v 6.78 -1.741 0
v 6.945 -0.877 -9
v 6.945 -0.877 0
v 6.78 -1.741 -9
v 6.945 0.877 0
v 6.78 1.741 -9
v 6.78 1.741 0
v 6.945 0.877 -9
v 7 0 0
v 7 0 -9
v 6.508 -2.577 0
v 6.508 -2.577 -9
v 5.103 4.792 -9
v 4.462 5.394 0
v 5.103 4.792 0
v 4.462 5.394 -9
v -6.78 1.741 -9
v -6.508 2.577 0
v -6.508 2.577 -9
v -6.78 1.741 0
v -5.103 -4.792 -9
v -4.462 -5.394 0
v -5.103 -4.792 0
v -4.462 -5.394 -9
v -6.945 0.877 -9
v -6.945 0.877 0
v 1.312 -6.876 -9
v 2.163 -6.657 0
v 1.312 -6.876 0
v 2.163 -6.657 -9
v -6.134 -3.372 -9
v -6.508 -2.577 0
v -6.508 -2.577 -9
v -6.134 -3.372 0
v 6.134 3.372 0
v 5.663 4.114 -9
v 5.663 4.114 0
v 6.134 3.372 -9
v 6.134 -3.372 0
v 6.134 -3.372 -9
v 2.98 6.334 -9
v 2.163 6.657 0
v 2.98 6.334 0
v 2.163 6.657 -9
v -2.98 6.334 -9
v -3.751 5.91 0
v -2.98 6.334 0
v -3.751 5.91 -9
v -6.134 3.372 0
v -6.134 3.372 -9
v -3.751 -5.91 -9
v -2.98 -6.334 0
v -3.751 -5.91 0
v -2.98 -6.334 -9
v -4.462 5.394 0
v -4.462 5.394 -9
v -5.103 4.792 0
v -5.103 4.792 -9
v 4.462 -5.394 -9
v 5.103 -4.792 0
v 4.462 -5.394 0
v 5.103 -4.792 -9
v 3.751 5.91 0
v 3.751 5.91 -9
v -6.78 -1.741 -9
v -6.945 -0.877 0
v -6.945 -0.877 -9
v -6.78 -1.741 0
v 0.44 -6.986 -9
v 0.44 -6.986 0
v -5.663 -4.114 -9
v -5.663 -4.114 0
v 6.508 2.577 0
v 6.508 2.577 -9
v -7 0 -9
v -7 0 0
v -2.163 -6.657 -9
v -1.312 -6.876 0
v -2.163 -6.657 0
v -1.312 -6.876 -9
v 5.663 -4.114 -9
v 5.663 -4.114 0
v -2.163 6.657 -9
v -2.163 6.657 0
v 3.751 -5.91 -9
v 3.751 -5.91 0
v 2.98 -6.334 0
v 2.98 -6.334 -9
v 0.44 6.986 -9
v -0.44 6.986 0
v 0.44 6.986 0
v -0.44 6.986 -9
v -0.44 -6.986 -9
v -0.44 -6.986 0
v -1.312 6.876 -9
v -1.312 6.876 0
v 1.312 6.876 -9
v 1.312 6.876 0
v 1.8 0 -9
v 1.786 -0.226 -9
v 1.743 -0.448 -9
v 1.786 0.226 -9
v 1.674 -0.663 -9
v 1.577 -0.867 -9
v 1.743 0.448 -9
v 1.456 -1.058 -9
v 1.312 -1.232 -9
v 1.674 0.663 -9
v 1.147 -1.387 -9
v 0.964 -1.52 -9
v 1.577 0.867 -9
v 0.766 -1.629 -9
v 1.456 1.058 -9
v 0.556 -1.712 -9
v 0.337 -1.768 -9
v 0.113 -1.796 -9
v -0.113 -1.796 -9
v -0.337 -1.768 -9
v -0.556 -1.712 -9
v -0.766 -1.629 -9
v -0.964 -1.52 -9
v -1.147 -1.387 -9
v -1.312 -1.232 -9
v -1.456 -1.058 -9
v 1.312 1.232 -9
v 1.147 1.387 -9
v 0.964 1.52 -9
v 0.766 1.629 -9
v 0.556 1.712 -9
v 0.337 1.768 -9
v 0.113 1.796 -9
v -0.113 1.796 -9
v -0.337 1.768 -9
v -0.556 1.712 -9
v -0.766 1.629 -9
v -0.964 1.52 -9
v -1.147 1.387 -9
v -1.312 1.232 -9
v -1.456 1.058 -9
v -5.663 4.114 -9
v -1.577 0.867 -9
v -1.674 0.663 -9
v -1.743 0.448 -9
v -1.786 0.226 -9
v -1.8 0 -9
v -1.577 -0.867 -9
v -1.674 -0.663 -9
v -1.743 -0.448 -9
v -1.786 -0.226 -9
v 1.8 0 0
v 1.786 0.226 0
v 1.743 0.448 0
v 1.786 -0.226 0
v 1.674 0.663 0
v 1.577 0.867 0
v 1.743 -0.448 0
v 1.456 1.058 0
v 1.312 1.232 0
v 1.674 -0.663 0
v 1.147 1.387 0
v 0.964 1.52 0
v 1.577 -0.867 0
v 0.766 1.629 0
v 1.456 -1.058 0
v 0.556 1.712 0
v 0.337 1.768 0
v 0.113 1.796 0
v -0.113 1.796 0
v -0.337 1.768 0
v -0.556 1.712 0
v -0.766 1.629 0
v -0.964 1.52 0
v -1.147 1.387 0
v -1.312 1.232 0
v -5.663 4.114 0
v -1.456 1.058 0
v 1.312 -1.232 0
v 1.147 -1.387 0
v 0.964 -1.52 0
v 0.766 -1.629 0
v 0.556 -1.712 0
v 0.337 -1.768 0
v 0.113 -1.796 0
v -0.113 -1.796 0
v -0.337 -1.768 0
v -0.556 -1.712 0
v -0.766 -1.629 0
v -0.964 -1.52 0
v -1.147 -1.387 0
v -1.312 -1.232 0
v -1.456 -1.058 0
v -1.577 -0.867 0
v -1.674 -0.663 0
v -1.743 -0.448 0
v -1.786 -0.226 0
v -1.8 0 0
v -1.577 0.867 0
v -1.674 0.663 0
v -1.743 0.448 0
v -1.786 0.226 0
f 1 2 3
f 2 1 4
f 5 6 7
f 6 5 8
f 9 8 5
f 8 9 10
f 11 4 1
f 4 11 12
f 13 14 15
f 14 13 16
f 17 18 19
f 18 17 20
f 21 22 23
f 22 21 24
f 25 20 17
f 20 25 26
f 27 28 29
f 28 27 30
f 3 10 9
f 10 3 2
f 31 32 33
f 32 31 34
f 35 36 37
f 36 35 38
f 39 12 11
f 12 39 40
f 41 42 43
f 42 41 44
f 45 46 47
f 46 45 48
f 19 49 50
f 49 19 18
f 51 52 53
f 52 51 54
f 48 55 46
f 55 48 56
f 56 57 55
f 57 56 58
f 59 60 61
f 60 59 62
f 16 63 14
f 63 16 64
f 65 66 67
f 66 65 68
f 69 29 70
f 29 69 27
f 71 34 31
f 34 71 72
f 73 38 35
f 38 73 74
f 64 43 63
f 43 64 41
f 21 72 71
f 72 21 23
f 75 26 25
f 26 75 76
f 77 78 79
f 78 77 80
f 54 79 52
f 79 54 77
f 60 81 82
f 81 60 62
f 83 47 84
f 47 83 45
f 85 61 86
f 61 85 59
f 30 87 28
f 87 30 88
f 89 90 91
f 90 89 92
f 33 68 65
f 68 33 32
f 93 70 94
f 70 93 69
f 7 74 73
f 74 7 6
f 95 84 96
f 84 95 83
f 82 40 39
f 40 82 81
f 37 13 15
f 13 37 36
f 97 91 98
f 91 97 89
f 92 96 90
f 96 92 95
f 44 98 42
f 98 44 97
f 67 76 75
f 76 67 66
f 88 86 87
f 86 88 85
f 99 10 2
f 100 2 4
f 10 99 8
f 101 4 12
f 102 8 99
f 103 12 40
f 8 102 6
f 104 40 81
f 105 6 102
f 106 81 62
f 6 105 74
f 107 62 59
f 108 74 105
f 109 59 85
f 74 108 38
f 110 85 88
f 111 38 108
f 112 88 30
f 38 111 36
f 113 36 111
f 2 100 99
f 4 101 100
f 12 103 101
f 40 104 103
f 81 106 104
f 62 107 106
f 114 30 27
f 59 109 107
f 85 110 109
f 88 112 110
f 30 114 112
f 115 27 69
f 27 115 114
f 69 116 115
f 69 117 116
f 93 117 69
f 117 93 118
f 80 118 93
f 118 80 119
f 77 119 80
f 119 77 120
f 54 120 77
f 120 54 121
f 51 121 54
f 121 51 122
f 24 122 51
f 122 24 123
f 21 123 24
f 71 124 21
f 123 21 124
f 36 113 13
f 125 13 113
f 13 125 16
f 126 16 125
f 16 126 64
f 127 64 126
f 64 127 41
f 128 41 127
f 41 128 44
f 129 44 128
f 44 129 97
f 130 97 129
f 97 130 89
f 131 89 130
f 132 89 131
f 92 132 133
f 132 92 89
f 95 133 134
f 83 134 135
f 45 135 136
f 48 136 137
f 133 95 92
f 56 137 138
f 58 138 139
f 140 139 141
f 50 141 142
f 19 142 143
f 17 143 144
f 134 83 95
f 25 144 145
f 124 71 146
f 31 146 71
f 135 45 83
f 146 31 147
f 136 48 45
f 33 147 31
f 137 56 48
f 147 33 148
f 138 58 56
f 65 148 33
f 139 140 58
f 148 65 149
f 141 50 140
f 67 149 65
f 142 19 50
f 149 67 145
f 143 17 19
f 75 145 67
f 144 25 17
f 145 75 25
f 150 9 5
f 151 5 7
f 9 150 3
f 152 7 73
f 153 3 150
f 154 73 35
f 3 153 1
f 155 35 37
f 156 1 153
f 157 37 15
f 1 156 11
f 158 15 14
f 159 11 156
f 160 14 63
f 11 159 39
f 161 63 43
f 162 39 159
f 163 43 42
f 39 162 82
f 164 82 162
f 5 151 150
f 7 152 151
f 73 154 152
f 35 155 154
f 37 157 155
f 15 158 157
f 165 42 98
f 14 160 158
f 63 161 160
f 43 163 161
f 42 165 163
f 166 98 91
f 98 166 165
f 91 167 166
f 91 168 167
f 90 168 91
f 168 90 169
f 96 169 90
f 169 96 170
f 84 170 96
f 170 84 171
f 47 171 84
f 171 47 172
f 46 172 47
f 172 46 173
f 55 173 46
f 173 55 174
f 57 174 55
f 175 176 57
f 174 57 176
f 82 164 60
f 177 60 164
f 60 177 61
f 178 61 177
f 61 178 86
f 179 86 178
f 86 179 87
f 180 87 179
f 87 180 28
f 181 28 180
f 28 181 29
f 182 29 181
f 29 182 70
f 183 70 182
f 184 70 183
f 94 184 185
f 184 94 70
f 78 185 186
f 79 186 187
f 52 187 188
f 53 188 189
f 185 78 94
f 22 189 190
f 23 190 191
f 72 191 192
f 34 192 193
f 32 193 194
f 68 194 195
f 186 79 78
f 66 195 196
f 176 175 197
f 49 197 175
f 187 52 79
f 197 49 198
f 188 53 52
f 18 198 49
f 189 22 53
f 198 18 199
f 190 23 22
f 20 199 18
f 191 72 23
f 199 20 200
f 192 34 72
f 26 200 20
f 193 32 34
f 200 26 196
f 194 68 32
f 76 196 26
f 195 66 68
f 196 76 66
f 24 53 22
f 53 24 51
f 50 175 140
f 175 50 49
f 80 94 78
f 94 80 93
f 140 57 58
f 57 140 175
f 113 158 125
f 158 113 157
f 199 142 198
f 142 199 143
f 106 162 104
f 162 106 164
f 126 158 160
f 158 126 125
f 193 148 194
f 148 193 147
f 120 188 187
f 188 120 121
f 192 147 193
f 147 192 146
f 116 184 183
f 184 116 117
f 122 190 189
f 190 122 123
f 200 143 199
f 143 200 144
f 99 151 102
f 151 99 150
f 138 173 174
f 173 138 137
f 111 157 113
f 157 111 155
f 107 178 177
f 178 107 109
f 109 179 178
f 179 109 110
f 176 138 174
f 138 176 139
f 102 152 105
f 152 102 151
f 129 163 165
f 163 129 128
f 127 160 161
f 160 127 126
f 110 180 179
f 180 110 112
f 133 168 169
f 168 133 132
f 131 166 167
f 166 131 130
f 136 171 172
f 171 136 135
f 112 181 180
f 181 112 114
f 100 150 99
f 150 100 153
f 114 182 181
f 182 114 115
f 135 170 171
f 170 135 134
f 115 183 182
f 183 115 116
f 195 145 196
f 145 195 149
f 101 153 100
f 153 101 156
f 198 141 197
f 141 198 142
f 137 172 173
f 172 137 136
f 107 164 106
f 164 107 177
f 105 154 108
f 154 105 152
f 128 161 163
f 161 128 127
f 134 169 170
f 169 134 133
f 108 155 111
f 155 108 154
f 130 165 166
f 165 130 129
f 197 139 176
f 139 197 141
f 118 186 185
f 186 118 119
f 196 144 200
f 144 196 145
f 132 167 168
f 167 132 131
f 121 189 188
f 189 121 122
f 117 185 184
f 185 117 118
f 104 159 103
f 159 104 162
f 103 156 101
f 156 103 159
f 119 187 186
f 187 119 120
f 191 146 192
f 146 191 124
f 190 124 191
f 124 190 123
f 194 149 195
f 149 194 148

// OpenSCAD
$fn = 50;


difference() {
	union() {
		translate(v = [0, 0, -9.0000000000]) {
			cylinder(h = 9, r = 7.0000000000);
		}
		cylinder(h = 0, r = 13.0000000000);
	}
	union() {
		#translate(v = [0, 0, -9]) {
			cylinder(h = 9, r = 1.8000000000);
		}
	}
}
